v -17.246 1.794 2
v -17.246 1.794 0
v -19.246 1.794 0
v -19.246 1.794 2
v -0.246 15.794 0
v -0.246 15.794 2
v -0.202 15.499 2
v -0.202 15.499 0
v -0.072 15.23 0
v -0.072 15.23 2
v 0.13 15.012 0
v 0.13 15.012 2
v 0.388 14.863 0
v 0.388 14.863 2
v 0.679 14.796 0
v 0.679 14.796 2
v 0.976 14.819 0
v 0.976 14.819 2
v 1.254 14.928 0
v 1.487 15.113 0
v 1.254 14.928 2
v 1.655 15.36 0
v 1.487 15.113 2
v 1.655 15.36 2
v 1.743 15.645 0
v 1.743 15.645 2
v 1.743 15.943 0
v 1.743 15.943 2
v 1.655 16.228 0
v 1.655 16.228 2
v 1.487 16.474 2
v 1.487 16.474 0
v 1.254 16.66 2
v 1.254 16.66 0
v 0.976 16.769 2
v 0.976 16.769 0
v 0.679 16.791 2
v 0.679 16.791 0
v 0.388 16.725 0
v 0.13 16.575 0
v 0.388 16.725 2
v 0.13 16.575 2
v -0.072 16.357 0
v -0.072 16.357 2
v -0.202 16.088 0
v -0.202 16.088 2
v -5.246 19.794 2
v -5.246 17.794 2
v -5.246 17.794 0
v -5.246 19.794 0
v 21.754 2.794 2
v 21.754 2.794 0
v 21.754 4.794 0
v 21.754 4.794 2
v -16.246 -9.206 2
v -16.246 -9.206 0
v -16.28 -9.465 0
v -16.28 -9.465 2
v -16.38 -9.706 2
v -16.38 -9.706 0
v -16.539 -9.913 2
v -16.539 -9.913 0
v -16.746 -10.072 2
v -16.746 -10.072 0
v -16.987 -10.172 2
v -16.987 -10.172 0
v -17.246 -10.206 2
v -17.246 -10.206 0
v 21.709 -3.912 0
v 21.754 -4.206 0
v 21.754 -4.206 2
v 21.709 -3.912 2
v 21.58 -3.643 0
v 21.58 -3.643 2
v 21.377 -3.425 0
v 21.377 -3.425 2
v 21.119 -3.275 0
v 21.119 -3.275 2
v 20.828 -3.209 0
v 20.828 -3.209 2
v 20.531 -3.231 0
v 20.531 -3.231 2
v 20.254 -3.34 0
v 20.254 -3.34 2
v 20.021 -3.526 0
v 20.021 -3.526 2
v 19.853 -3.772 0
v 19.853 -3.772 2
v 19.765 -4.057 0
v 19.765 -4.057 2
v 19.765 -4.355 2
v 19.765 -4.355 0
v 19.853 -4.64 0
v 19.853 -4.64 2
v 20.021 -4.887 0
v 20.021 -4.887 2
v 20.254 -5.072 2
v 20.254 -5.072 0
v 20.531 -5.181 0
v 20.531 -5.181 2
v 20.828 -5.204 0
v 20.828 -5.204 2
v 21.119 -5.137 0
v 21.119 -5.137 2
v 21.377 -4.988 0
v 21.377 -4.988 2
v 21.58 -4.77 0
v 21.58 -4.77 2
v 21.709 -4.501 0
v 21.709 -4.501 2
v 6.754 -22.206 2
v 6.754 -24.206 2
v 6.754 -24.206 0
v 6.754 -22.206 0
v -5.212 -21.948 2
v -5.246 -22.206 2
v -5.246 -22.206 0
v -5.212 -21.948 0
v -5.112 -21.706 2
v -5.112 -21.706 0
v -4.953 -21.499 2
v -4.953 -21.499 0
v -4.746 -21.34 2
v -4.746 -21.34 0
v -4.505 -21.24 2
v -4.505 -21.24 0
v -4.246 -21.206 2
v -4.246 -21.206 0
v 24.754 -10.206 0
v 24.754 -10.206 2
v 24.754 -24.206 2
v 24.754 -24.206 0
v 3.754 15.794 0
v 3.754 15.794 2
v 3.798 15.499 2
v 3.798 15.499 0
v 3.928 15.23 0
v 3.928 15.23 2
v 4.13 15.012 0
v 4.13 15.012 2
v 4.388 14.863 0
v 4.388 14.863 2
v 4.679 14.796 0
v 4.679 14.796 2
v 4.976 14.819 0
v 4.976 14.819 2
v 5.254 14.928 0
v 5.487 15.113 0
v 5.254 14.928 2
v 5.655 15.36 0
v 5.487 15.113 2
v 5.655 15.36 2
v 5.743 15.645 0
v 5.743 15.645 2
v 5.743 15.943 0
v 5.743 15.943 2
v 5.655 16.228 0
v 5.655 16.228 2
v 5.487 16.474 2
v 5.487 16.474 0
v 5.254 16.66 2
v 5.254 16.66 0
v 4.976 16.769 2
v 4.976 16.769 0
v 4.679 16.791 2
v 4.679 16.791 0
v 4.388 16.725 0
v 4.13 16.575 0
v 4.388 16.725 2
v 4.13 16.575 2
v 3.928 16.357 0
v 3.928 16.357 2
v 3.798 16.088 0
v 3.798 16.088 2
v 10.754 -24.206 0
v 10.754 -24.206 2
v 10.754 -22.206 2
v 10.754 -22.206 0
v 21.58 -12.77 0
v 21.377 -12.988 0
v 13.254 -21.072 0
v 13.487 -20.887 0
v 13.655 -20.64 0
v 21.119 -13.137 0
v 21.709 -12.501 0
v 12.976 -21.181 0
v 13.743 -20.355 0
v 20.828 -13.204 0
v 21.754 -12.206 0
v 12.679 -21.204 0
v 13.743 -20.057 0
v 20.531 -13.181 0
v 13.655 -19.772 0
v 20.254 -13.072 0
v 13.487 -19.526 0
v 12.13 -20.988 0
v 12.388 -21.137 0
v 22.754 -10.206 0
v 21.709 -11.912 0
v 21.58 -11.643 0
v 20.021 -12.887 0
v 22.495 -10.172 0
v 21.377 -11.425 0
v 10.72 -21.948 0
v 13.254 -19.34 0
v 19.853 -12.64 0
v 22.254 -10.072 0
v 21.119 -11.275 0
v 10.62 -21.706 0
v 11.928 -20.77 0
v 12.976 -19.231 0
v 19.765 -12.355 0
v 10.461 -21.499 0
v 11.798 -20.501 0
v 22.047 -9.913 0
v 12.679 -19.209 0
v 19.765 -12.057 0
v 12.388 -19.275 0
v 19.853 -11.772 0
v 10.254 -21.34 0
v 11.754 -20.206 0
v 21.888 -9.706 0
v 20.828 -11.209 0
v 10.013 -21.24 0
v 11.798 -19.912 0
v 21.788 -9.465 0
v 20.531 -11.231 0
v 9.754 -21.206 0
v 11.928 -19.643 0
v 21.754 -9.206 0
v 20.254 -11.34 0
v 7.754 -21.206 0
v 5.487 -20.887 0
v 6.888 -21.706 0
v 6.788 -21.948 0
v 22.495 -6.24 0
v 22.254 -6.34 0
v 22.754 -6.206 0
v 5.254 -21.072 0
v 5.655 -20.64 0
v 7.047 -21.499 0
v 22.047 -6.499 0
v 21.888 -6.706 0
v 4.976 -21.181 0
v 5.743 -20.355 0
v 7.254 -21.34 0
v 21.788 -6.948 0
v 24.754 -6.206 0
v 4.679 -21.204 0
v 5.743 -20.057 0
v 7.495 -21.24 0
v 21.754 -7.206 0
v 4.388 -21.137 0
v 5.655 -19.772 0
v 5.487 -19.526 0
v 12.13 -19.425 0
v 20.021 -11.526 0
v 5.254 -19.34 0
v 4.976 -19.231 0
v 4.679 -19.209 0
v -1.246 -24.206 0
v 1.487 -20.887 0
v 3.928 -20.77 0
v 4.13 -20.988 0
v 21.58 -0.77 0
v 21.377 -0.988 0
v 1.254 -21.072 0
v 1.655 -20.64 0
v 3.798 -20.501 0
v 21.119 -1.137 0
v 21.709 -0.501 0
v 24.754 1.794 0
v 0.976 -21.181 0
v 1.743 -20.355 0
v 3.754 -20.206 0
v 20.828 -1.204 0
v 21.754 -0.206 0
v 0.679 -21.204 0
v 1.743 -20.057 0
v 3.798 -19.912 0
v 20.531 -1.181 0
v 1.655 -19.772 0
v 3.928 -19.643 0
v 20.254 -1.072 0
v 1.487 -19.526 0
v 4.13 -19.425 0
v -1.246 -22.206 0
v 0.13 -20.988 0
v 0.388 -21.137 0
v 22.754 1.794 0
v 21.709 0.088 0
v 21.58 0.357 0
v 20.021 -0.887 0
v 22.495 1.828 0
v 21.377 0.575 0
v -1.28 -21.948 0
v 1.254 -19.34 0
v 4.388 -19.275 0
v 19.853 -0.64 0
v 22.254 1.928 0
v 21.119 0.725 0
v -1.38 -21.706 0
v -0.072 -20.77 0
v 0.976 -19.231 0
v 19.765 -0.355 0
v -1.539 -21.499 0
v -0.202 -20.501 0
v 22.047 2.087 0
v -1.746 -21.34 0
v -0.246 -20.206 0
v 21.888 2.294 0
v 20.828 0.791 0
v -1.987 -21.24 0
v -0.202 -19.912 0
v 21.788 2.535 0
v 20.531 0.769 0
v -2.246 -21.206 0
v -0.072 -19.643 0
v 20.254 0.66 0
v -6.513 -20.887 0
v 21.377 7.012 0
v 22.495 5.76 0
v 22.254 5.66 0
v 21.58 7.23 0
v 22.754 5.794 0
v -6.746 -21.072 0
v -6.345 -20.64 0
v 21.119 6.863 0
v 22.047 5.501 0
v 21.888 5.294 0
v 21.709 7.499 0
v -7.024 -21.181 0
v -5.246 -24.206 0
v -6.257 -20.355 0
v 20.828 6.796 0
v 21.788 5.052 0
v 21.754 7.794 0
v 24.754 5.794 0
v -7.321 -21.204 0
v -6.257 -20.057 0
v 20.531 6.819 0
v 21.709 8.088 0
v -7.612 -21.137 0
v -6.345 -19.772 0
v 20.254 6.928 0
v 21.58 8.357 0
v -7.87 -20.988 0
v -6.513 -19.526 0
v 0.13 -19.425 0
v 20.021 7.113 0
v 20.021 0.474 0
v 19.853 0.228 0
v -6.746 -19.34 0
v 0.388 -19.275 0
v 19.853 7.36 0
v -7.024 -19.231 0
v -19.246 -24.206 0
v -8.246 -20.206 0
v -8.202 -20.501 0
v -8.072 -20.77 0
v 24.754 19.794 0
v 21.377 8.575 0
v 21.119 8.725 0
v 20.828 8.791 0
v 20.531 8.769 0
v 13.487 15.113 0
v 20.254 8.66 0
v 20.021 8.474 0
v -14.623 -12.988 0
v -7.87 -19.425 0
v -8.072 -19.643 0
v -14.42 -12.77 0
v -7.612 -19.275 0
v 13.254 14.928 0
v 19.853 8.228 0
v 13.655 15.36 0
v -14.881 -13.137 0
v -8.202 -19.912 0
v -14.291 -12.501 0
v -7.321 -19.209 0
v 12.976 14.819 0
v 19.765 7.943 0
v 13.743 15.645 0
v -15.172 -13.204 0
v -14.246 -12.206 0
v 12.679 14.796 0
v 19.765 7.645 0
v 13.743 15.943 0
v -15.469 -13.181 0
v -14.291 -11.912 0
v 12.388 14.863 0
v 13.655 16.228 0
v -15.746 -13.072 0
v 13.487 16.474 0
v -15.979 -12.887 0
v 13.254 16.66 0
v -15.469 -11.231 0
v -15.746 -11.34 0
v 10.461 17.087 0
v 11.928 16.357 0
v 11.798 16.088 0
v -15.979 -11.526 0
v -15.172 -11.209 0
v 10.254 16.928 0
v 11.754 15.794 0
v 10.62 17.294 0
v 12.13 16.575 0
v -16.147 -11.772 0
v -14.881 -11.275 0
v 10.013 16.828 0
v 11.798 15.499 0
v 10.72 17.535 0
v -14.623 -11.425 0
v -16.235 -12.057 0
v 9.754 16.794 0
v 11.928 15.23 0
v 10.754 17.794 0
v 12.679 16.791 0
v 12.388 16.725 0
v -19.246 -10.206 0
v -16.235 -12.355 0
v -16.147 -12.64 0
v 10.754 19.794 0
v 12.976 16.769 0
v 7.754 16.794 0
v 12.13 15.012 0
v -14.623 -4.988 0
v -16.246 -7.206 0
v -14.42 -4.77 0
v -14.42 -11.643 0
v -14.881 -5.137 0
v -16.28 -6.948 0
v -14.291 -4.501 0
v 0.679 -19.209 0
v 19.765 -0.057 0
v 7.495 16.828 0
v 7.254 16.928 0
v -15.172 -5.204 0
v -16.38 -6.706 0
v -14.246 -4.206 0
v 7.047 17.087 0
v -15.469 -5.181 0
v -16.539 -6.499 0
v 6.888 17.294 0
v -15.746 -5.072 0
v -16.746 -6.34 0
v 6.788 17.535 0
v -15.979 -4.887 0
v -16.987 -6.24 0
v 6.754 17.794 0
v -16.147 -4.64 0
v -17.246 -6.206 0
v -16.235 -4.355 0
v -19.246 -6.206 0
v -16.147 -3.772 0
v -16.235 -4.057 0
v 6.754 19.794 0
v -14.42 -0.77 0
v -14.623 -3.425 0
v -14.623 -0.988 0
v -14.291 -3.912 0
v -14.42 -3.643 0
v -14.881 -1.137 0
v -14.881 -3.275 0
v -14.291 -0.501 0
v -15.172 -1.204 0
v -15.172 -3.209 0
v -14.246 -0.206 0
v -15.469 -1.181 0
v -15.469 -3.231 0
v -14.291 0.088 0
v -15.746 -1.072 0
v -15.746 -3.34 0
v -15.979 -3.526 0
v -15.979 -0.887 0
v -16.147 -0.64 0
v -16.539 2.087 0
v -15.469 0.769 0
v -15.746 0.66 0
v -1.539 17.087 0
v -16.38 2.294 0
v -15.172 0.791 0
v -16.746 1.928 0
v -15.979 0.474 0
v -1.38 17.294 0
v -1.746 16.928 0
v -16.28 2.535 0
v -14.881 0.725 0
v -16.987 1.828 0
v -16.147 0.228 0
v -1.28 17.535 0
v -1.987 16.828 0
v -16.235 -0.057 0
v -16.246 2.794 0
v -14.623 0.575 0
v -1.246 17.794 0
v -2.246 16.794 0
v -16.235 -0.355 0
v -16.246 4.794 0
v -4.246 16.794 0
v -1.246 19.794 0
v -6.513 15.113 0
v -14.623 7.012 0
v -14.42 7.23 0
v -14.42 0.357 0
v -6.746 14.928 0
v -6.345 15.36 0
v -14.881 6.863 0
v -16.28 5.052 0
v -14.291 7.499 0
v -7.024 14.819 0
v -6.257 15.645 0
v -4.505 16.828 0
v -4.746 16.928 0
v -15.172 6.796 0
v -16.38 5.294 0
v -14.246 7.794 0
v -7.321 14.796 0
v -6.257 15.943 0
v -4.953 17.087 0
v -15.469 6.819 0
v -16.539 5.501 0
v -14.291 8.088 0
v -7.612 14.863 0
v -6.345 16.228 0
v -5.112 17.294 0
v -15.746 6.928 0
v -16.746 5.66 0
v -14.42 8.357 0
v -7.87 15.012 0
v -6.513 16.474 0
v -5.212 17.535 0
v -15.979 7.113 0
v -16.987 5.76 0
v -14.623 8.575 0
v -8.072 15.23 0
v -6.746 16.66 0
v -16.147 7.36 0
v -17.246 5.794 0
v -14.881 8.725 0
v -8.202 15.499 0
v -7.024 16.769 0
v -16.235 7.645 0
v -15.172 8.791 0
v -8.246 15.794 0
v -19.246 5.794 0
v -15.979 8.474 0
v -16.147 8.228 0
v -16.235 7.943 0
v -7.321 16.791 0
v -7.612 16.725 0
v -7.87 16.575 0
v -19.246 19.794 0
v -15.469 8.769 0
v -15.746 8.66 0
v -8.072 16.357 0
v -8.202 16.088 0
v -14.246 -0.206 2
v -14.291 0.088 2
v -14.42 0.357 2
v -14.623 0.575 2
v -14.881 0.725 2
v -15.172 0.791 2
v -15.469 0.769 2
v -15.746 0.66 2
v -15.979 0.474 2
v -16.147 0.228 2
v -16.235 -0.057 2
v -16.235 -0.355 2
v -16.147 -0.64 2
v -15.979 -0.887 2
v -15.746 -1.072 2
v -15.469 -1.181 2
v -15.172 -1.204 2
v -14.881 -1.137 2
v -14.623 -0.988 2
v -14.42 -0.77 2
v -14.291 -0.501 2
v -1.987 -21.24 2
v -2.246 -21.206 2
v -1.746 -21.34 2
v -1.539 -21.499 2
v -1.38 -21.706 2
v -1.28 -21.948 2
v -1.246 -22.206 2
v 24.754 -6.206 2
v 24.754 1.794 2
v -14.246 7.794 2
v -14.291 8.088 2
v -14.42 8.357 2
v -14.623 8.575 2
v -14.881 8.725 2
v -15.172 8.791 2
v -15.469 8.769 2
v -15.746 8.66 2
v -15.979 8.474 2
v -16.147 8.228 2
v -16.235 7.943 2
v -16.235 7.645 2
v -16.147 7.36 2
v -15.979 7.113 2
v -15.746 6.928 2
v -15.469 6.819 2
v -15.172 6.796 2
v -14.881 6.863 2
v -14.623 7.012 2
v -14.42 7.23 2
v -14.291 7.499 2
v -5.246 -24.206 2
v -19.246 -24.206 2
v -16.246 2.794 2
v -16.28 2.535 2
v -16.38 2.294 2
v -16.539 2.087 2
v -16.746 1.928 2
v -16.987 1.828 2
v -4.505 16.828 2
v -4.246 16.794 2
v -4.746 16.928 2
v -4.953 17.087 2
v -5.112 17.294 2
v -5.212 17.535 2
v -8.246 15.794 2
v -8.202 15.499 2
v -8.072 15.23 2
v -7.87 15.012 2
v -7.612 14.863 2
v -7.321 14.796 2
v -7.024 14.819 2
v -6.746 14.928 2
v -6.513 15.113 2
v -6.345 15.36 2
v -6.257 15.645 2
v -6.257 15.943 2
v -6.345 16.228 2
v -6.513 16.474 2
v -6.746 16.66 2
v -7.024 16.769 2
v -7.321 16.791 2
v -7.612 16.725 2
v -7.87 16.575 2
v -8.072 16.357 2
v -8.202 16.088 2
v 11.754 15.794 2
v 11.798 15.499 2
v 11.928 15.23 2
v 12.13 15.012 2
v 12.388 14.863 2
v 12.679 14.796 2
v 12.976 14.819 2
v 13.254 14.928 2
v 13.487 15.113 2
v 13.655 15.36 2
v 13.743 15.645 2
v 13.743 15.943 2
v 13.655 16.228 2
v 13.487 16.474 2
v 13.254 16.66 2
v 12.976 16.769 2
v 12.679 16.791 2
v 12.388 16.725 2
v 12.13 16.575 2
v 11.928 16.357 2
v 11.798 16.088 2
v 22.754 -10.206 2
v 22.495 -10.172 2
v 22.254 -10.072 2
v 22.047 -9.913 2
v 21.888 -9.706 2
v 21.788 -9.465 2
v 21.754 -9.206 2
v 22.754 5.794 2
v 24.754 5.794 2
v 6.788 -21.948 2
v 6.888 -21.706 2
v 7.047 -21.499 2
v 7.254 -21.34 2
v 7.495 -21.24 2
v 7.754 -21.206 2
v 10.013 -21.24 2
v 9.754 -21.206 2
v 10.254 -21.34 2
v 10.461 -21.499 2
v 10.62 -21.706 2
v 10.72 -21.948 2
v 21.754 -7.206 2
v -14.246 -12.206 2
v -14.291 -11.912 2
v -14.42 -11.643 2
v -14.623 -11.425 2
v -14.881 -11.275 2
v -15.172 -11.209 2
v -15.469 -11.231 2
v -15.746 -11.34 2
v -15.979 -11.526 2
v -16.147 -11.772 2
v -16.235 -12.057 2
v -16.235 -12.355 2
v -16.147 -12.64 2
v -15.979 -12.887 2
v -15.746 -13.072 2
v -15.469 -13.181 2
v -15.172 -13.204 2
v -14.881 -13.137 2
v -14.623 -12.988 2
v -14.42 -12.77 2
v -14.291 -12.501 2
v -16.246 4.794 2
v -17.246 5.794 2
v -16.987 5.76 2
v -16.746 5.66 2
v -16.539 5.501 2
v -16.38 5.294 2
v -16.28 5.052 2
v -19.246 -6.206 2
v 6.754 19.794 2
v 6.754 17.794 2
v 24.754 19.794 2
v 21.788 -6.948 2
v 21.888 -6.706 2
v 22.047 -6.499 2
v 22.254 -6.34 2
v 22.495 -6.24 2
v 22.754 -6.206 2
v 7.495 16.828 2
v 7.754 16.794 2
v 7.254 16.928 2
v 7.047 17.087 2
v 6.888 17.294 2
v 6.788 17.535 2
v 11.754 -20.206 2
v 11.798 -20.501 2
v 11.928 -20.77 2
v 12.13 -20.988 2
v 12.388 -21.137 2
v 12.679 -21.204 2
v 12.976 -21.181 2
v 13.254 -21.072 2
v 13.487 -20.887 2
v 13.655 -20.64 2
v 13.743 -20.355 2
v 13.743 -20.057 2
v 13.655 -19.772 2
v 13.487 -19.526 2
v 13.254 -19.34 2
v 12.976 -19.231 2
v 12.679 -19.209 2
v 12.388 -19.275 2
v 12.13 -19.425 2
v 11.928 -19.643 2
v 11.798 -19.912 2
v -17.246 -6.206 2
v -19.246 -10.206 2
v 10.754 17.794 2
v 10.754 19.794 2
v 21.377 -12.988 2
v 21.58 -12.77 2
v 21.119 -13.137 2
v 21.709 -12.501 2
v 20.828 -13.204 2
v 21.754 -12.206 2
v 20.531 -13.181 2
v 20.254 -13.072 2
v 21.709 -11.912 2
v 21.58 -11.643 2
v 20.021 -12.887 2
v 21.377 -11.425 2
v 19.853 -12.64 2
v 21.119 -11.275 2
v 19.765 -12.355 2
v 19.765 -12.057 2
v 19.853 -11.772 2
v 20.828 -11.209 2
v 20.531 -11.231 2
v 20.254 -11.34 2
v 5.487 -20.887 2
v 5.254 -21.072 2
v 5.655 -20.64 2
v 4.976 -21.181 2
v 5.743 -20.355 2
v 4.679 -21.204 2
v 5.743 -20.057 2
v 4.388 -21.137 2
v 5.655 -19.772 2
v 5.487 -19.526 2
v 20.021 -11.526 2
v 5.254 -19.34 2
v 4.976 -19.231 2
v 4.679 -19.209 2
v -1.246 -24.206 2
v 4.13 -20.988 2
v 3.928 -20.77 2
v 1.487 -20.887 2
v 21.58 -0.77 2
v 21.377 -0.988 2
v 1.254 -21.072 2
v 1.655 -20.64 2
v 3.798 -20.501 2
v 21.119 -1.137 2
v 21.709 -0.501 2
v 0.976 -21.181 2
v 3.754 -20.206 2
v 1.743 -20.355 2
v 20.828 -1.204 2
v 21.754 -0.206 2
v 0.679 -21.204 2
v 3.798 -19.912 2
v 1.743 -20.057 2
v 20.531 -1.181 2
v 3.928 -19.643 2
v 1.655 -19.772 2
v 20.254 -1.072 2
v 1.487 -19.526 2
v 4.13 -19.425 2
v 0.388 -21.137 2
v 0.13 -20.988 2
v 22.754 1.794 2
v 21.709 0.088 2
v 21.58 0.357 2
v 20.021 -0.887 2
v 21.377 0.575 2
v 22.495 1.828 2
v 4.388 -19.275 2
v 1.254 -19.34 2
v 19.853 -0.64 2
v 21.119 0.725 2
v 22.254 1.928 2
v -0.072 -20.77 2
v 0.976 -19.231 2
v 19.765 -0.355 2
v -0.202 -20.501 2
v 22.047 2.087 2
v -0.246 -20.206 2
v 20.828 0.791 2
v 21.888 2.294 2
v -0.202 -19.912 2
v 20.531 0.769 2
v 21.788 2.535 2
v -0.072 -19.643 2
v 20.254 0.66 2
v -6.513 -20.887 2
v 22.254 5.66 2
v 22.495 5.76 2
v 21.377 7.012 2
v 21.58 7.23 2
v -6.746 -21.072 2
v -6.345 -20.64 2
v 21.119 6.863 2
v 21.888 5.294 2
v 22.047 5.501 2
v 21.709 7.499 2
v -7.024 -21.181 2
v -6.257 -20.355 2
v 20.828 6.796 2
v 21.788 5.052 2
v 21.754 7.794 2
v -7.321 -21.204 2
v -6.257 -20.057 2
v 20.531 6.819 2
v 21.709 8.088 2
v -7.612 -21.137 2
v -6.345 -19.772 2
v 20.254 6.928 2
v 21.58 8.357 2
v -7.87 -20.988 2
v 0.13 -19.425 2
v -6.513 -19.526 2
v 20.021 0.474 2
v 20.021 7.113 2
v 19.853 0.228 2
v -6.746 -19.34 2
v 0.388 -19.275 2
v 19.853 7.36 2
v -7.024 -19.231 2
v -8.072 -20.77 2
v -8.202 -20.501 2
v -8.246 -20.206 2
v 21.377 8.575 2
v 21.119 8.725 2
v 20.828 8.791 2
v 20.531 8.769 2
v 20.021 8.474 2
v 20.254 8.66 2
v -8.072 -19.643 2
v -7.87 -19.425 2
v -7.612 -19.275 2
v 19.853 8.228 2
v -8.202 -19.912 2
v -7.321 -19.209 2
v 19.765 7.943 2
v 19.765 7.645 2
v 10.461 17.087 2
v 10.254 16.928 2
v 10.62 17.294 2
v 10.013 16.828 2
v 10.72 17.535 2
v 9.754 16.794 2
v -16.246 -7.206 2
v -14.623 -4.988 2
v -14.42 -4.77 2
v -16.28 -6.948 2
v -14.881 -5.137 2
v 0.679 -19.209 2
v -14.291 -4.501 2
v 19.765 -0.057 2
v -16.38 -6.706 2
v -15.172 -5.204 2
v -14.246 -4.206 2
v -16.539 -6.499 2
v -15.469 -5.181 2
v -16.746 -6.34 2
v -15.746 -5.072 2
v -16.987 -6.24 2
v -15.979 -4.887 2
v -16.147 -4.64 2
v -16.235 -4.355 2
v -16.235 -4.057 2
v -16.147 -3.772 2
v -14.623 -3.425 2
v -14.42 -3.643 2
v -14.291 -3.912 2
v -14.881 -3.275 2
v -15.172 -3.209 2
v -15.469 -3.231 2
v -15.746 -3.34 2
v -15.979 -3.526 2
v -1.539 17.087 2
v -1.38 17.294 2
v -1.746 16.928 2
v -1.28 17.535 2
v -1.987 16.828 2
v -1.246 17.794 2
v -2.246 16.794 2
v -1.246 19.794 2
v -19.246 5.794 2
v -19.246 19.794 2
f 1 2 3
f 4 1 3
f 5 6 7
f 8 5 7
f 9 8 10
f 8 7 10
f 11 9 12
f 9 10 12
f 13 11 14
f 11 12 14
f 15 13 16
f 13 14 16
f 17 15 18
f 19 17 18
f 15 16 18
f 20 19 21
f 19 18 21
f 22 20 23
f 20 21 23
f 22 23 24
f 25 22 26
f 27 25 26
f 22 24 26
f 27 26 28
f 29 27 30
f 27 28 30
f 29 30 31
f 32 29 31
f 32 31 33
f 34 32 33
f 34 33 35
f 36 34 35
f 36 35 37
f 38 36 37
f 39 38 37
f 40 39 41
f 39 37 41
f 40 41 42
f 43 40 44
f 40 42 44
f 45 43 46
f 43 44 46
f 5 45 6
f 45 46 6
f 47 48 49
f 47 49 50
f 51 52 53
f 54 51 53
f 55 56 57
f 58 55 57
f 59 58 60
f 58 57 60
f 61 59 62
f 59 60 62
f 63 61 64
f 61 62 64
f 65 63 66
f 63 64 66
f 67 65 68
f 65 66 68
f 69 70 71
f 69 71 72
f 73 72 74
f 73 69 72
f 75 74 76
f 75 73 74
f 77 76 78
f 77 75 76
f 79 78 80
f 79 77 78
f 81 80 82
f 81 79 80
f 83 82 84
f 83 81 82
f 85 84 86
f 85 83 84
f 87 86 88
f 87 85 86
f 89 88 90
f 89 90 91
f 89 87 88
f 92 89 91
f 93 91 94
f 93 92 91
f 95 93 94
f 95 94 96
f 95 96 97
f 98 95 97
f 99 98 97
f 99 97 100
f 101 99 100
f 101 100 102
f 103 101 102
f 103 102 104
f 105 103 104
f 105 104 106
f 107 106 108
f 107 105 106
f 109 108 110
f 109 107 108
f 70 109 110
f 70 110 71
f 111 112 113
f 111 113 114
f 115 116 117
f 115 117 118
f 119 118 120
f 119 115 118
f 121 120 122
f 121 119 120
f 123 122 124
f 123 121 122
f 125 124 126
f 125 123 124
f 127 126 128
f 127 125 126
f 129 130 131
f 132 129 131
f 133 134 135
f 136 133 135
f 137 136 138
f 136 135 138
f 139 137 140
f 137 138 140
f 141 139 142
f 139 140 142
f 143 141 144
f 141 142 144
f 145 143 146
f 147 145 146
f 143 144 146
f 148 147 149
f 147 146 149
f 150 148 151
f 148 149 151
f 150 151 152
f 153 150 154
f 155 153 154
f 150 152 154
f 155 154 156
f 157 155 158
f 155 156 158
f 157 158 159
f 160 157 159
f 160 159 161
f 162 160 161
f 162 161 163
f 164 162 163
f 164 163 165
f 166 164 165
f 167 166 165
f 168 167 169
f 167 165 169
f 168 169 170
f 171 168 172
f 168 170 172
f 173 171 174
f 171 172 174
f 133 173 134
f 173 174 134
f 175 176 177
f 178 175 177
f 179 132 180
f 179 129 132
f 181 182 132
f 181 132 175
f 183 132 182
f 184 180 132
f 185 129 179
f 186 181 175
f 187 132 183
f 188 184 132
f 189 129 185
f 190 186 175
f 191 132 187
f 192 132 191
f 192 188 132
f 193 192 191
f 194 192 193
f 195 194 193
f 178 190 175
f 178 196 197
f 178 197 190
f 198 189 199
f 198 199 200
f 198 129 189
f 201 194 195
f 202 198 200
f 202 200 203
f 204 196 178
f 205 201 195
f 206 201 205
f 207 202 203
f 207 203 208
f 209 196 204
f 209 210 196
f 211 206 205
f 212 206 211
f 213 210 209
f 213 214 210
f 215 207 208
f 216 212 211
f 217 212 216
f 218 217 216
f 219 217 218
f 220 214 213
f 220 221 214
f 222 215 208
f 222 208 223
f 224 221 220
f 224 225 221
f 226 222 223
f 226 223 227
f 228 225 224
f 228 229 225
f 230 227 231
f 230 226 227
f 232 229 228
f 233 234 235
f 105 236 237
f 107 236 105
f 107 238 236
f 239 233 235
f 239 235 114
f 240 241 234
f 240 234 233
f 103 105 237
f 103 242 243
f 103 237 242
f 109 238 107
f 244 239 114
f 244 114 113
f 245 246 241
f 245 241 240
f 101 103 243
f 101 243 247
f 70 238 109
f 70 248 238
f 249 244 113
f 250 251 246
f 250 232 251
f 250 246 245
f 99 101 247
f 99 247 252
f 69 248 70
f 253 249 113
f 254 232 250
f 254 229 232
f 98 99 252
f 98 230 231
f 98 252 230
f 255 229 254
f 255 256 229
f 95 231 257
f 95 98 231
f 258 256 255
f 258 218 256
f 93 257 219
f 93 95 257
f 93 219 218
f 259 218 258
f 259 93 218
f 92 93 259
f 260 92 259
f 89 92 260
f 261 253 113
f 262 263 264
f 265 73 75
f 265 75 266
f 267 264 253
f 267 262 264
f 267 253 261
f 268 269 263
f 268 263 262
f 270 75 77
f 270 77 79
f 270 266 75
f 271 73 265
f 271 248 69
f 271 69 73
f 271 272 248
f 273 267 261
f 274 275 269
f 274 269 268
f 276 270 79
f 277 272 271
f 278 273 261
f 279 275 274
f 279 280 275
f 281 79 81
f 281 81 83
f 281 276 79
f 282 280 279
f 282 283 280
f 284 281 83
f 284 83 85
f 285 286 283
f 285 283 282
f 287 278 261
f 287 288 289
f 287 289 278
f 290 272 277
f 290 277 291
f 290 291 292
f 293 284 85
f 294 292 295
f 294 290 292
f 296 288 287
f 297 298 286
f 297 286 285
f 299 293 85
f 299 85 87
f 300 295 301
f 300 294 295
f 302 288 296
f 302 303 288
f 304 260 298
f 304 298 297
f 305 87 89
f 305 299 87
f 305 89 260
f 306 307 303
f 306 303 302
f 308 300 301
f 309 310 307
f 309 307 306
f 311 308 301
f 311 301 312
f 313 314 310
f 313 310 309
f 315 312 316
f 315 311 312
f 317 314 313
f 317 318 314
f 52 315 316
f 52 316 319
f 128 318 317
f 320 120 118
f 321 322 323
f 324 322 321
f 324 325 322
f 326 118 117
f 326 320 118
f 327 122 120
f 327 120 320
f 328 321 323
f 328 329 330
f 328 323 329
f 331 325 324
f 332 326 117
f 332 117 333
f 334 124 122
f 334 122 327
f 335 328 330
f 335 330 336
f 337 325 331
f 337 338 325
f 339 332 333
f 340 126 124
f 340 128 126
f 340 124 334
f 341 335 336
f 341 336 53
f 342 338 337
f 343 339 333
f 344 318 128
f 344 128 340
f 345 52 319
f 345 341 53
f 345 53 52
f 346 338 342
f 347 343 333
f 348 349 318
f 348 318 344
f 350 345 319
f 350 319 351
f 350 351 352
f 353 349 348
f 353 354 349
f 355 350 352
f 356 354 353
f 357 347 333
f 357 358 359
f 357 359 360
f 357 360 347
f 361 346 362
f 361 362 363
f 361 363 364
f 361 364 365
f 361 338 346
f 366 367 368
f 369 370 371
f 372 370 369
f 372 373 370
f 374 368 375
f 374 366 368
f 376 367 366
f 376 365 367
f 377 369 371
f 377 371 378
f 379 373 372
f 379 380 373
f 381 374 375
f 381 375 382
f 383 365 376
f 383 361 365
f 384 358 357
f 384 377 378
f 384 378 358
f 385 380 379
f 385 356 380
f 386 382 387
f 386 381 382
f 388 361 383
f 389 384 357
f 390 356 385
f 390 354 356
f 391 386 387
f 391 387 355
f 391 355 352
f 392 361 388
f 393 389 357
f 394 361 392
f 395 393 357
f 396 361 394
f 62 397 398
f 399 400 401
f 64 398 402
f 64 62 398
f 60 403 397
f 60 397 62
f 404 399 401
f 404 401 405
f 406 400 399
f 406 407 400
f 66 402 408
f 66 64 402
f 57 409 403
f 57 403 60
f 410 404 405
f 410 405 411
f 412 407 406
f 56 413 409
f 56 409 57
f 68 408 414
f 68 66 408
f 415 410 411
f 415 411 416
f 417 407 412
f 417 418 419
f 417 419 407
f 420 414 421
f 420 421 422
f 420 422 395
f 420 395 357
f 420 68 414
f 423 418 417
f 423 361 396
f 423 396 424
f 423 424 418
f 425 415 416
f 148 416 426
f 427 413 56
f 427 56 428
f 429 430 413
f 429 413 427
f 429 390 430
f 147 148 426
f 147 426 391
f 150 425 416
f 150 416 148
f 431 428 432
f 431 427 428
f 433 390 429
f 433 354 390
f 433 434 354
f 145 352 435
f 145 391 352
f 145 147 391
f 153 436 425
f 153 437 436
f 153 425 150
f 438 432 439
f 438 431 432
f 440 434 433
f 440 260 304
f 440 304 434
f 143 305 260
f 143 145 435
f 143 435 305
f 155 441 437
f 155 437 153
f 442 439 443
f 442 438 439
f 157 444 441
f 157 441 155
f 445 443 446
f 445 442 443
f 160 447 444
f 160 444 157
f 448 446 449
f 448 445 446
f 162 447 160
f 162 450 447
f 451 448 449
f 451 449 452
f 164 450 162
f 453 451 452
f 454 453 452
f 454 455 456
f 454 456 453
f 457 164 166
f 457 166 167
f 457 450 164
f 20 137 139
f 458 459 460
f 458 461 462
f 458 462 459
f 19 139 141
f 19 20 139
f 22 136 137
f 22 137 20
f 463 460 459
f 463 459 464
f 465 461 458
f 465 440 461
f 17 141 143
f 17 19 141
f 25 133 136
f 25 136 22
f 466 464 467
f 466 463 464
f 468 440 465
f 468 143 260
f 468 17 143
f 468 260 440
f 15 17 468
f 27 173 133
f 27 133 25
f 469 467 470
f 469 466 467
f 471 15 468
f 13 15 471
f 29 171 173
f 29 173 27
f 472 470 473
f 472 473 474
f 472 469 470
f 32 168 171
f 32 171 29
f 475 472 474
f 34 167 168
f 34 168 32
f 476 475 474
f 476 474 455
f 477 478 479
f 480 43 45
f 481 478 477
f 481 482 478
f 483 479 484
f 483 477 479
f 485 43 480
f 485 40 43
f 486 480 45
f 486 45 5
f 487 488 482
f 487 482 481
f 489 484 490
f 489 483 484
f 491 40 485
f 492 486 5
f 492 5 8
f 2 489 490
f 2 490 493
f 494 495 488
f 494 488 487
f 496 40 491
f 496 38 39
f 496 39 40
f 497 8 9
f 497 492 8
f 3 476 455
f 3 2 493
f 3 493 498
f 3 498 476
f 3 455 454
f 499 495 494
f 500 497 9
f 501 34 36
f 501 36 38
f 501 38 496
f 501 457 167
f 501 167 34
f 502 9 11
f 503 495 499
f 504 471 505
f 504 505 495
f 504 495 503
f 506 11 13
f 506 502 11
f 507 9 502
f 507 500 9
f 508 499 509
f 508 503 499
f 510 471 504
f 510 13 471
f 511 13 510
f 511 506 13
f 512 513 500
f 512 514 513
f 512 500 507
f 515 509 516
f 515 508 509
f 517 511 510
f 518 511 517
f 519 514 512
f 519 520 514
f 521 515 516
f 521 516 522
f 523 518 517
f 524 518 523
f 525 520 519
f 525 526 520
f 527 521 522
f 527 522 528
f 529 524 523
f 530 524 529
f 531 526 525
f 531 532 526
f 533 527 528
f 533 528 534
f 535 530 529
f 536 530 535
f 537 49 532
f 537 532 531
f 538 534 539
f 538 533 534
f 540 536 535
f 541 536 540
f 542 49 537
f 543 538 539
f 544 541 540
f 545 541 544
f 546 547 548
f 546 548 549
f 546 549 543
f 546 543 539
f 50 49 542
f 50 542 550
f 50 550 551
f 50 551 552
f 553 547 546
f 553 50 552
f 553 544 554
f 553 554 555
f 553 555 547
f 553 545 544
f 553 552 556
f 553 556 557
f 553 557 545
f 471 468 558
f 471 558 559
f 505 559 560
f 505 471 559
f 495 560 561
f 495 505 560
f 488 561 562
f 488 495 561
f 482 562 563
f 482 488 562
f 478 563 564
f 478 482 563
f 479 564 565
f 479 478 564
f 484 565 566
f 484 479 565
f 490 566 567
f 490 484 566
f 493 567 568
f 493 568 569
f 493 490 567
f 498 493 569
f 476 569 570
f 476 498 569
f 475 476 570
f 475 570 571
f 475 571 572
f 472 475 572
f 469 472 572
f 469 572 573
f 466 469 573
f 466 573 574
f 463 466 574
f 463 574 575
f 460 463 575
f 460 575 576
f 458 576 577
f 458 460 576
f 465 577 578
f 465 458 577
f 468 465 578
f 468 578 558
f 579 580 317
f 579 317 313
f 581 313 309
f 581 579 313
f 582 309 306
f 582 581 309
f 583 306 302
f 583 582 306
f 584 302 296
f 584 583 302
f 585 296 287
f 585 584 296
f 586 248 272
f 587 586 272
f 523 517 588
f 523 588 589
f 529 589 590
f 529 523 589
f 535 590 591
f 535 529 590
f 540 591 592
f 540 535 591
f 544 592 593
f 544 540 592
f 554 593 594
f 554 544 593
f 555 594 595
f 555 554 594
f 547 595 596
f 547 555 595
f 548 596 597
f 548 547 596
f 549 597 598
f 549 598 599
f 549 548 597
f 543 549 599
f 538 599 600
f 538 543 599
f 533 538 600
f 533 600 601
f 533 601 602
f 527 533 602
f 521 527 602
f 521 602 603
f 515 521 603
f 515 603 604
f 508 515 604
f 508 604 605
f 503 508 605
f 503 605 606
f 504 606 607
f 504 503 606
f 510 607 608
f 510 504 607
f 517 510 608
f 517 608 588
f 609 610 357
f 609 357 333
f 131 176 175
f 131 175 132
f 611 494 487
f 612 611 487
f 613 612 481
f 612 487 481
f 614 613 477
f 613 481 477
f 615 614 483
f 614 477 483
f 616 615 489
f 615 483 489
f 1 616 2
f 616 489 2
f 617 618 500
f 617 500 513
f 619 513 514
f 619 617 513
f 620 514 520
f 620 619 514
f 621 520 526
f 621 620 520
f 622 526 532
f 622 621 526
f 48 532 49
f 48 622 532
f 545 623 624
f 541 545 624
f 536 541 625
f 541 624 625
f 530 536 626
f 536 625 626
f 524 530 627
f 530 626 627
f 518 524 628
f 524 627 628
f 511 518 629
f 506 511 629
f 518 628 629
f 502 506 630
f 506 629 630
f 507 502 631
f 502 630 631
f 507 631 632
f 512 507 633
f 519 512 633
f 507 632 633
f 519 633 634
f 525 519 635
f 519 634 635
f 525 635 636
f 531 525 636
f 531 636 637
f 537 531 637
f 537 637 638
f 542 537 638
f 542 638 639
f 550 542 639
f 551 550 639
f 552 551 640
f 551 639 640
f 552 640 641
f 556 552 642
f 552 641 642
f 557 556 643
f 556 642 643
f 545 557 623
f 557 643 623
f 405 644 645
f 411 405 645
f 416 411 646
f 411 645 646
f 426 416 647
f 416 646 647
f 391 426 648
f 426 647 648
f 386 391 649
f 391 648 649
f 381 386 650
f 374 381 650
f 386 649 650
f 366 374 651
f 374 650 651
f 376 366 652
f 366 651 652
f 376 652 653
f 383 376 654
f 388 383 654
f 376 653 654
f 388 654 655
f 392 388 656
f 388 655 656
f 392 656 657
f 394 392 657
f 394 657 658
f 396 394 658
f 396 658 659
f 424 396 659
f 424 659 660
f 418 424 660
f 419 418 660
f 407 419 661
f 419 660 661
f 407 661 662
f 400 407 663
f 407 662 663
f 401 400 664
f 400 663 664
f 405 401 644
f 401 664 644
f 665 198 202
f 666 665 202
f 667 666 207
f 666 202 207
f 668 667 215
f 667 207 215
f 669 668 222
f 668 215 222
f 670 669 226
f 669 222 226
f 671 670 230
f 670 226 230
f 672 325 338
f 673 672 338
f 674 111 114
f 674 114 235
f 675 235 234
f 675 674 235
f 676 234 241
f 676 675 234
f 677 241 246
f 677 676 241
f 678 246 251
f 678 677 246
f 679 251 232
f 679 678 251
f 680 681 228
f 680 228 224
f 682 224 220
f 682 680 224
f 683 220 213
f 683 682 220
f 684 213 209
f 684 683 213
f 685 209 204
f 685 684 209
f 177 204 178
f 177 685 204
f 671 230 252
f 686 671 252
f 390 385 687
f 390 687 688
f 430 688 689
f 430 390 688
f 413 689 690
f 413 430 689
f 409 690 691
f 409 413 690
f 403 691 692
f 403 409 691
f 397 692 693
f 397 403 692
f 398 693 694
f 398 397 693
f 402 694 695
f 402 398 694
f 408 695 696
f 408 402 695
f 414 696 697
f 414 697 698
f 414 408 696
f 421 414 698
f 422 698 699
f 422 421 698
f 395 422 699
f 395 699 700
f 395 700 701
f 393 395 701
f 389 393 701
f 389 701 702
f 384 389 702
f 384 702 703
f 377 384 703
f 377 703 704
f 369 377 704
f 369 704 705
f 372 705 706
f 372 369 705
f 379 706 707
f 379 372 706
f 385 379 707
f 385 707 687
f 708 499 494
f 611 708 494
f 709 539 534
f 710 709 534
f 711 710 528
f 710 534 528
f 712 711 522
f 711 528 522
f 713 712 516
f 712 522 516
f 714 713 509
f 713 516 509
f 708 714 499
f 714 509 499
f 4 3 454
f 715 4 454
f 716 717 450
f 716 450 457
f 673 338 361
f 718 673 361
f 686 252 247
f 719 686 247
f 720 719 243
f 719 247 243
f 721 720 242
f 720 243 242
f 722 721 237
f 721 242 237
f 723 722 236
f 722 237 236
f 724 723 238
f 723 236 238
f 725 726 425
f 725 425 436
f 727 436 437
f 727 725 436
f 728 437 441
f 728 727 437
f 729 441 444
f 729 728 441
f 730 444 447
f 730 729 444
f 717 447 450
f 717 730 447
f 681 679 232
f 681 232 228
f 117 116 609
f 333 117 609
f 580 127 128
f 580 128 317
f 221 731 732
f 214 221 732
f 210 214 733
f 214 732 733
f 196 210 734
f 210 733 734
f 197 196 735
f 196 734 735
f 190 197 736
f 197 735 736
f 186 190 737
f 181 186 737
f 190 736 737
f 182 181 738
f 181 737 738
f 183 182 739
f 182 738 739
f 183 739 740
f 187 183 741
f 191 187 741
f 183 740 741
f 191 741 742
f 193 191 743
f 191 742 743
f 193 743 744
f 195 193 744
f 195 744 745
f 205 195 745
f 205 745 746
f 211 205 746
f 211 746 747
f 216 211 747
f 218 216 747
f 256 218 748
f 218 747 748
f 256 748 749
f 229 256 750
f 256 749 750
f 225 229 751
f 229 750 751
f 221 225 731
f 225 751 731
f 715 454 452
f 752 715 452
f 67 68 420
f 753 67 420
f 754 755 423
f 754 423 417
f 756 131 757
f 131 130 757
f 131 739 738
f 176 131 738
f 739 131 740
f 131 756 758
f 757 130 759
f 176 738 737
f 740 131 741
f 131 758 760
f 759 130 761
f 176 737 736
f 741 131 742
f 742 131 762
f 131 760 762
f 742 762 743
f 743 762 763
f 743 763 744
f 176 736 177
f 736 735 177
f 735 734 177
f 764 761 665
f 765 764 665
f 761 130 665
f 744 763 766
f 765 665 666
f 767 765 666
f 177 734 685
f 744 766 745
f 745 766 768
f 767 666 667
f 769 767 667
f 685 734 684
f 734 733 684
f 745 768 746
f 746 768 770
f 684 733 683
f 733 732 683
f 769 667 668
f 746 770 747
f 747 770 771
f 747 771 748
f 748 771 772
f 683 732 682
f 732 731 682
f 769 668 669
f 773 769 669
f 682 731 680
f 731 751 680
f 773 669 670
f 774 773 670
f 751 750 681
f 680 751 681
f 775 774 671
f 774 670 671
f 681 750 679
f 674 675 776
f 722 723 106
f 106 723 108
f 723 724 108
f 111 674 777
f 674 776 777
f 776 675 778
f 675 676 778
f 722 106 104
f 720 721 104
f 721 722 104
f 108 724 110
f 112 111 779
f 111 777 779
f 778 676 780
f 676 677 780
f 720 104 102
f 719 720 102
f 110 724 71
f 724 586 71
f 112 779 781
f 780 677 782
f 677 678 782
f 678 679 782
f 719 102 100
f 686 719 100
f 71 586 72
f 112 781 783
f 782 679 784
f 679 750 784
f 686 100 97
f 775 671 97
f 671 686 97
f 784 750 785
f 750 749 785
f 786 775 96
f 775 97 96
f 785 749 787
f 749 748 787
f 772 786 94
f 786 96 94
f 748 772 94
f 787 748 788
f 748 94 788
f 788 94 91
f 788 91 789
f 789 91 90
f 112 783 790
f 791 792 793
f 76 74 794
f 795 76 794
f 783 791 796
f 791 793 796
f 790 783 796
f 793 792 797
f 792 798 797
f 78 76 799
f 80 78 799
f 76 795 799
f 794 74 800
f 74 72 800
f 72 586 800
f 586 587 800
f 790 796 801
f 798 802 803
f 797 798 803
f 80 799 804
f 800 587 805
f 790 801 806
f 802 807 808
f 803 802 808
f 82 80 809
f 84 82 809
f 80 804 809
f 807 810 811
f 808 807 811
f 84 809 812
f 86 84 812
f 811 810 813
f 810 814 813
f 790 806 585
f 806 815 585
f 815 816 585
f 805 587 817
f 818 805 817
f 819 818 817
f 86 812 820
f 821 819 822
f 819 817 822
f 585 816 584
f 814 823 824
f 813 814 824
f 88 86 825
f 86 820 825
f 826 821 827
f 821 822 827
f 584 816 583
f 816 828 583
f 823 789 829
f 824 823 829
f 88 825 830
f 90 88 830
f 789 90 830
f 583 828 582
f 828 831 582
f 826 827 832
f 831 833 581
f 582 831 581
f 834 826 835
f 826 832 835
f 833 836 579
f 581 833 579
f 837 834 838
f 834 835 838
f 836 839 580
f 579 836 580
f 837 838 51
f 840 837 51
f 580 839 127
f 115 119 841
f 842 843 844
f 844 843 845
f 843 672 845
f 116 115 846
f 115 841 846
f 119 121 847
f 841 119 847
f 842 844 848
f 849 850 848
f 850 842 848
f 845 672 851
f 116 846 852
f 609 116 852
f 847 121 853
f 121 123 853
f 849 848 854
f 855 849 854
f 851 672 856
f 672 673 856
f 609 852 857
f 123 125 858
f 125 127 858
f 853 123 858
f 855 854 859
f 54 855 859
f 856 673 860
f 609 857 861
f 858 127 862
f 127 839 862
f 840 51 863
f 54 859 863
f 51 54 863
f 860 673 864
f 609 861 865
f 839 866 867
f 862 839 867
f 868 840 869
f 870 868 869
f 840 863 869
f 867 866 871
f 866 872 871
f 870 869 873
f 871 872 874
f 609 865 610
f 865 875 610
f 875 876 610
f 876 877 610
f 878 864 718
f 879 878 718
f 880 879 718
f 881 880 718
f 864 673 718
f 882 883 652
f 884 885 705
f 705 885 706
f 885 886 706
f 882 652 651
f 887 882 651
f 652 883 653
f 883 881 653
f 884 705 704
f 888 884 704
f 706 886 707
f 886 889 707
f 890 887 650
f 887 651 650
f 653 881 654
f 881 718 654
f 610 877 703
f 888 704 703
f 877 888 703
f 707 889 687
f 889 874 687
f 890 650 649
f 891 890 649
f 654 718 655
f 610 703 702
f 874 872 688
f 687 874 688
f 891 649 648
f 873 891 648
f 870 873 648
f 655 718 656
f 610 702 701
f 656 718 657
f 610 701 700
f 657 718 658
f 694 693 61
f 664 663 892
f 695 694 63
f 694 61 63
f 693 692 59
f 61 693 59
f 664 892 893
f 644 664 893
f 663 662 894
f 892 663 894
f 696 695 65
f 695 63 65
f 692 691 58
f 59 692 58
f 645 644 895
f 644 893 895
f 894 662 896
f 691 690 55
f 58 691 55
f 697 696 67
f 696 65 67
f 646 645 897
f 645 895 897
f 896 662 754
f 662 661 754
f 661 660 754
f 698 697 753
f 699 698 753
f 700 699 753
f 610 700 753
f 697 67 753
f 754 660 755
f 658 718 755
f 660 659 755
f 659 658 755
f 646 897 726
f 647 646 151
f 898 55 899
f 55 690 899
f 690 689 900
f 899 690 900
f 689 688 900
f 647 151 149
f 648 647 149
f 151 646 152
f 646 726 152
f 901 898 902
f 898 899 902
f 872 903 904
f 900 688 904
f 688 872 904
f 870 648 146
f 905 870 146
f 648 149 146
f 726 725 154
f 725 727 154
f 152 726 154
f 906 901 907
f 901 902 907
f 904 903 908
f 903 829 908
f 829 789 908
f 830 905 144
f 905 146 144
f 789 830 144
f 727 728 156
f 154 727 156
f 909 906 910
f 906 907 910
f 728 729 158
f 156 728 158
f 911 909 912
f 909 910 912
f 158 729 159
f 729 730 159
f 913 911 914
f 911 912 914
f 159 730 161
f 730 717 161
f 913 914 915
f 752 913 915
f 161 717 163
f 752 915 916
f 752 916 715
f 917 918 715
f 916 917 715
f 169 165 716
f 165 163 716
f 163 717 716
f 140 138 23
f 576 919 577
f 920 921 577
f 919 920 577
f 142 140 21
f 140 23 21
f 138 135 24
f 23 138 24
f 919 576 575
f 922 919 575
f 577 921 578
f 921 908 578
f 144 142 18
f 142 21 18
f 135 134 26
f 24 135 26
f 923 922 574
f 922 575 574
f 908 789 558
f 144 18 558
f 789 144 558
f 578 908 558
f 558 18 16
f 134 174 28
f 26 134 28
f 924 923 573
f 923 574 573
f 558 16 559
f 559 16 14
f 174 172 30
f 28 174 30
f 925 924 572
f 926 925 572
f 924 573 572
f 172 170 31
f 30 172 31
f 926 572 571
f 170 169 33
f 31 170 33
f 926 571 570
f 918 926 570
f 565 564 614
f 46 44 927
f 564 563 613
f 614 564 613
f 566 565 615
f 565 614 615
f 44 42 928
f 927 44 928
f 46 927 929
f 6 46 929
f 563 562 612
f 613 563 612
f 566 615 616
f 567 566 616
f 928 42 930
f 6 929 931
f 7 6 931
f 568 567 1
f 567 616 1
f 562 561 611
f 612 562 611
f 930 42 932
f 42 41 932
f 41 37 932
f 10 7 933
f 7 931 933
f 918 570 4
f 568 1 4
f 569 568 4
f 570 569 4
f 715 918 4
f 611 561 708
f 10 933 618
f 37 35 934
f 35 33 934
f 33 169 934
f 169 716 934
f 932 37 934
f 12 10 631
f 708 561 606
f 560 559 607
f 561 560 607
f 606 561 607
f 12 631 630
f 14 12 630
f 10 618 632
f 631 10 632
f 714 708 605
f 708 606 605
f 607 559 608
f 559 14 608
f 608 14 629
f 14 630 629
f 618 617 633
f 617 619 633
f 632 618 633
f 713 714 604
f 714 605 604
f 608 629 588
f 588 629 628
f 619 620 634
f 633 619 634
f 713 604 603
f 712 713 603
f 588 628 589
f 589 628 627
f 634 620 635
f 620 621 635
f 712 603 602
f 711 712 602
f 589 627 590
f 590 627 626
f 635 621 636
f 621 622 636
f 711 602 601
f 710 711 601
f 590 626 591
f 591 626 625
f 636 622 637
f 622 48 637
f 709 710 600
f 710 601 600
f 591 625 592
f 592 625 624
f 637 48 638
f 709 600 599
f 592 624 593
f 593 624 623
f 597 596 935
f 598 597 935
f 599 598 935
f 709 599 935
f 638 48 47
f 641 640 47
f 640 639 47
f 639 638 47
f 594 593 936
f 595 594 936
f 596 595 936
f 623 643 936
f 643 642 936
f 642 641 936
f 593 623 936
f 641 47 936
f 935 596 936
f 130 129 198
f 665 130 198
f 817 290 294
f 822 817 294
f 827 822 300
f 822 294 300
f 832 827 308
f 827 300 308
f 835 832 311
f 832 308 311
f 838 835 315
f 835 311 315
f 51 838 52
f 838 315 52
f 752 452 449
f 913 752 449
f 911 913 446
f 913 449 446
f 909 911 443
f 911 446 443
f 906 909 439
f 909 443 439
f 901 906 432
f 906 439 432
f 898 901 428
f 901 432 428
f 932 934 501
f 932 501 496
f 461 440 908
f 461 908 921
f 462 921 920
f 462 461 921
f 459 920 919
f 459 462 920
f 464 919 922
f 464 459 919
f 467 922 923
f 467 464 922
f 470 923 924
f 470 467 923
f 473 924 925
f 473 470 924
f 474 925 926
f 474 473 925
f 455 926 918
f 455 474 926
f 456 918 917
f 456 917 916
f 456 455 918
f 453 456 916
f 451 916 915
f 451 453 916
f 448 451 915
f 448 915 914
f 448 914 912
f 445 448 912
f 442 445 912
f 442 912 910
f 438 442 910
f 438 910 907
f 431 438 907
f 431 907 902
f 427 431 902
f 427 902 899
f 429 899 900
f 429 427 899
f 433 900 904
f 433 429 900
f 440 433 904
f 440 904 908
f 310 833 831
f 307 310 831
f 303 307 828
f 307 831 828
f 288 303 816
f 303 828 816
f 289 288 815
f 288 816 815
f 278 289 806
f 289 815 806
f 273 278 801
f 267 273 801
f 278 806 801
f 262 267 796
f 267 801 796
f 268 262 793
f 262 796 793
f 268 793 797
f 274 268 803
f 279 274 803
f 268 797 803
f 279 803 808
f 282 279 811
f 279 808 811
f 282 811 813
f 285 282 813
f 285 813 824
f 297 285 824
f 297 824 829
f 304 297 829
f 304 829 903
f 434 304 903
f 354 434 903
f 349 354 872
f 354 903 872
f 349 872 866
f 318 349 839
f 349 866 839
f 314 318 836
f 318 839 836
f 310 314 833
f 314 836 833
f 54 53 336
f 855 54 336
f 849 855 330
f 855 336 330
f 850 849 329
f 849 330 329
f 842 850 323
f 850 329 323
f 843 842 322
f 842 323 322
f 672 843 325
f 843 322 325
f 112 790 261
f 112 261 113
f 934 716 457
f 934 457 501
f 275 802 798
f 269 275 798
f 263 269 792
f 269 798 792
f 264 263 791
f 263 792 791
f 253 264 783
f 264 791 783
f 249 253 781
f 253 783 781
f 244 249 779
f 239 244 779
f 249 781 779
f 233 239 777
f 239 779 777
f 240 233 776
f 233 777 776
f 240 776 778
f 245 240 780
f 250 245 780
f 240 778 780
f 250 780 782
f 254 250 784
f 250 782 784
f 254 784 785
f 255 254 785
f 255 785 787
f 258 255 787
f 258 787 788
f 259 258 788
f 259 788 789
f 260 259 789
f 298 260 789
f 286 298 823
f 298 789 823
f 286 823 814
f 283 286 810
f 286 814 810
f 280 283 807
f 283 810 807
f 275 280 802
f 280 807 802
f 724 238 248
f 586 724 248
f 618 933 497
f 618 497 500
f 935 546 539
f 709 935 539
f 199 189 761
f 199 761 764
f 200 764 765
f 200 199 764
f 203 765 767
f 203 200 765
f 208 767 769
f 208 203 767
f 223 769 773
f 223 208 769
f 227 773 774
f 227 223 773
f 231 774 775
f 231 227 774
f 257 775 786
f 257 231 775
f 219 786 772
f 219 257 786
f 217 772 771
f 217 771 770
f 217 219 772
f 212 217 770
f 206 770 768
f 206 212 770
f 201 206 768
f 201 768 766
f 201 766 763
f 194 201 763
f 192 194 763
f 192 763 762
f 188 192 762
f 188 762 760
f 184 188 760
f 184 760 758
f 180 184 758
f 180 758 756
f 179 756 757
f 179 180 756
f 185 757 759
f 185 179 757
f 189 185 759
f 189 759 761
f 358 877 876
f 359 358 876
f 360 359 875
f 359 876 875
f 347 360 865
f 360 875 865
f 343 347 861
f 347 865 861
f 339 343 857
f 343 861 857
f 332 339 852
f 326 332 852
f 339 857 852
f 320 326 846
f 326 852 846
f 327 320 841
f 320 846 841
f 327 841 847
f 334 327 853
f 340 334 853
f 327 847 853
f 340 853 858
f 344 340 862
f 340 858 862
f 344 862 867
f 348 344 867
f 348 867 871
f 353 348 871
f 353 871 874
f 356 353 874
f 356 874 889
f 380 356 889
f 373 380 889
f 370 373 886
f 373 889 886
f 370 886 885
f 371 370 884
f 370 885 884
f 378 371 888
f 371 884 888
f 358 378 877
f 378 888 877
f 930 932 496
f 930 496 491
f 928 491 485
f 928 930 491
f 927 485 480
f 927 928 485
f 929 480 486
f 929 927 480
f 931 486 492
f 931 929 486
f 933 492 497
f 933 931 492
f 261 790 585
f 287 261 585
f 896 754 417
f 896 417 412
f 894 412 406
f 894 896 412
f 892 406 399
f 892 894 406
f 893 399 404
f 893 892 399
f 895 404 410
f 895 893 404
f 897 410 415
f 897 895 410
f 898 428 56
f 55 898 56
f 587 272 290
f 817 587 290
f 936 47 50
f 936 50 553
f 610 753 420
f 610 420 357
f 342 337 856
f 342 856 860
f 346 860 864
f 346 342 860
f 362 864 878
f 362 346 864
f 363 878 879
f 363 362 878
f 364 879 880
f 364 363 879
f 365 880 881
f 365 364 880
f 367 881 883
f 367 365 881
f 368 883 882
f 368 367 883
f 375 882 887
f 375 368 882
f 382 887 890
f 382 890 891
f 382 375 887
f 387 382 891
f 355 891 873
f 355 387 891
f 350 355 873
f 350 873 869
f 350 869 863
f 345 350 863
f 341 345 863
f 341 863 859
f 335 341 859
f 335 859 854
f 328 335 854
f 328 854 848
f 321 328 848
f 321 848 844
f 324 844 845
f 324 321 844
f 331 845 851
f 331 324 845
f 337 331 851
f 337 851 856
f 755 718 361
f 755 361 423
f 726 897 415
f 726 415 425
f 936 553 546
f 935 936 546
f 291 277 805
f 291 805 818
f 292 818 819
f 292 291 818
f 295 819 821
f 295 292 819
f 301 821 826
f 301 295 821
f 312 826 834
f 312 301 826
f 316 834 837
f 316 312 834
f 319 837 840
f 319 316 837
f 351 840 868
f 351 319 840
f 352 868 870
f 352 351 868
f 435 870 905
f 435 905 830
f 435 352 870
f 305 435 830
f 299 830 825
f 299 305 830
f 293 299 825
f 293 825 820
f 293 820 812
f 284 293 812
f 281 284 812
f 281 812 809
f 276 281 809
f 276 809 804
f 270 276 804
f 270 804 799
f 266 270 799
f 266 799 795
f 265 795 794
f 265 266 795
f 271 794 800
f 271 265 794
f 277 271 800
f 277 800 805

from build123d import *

# Parameters (mm, degrees)
SKETCH_1_R          = 1
EXTRUDE_4_DEPTH     = 2
FILLET_1_R          = 1
EXTRUDE_5_DEPTH     = 2
SKETCH_5_R          = 1
CUT_EXTRUDE_3_DEPTH = 2
SKETCH_6_W          = 8
SKETCH_6_H          = 3
EXTRUDE_6_DEPTH     = 2


with BuildPart() as part:
    # 草圖1 → 填料-伸長4 (new body)
    with BuildSketch(Plane.XY):
        with BuildLine():
            Line((-19.246232324, 5.793640832), (-17.246232324, 5.793640832))
            ThreePointArc((-17.246232324, 5.793640832), (-16.539125543, 5.500747613), (-16.246232324, 4.793640832))
            Line((-16.246232324, 4.793640832), (-16.246232324, 2.793640832))
            ThreePointArc((-16.246232324, 2.793640832), (-16.539125543, 2.086534051), (-17.246232324, 1.793640832))
            Line((-17.246232324, 1.793640832), (-19.246232324, 1.793640832))
            Line((-19.246232324, 1.793640832), (-19.246232324, -6.206359168))
            Line((-19.246232324, -6.206359168), (-17.246232324, -6.206359168))
            ThreePointArc((-17.246232324, -6.206359168), (-16.539125543, -6.499252387), (-16.246232324, -7.206359168))
            Line((-16.246232324, -7.206359168), (-16.246232324, -9.206359168))
            ThreePointArc((-16.246232324, -9.206359168), (-16.539125543, -9.913465949), (-17.246232324, -10.206359168))
            Line((-17.246232324, -10.206359168), (-19.246232324, -10.206359168))
            Line((-19.246232324, -10.206359168), (-19.246232324, -18.206359168))
            Line((-19.246232324, -18.206359168), (24.753767676, -18.206359168))
            Line((24.753767676, -18.206359168), (24.753767676, -10.206359168))
            Line((24.753767676, -10.206359168), (22.753767676, -10.206359168))
            ThreePointArc((22.753767676, -10.206359168), (22.046660894, -9.913465949), (21.753767676, -9.206359168))
            Line((21.753767676, -9.206359168), (21.753767676, -7.206359168))
            ThreePointArc((21.753767676, -7.206359168), (22.046660894, -6.499252387), (22.753767676, -6.206359168))
            Line((22.753767676, -6.206359168), (24.753767676, -6.206359168))
            Line((24.753767676, -6.206359168), (24.753767676, 1.793640832))
            Line((24.753767676, 1.793640832), (22.753767676, 1.793640832))
            ThreePointArc((22.753767676, 1.793640832), (22.046660894, 2.086534051), (21.753767676, 2.793640832))
            Line((21.753767676, 2.793640832), (21.753767676, 4.793640832))
            ThreePointArc((21.753767676, 4.793640832), (22.046660894, 5.500747613), (22.753767676, 5.793640832))
            Line((22.753767676, 5.793640832), (24.753767676, 5.793640832))
            Line((24.753767676, 5.793640832), (24.753767676, 13.793640832))
            Line((24.753767676, 13.793640832), (-19.246232324, 13.793640832))
            Line((-19.246232324, 13.793640832), (-19.246232324, 5.793640832))
        make_face()
        with Locations((-15.246232324, 7.793640832)):
            Circle(SKETCH_1_R, mode=Mode.SUBTRACT)
        with Locations((-15.246232324, -0.206359168)):
            Circle(SKETCH_1_R, mode=Mode.SUBTRACT)
        with Locations((20.753767676, -12.206359168)):
            Circle(SKETCH_1_R, mode=Mode.SUBTRACT)
        with Locations((20.753767676, 7.793640832)):
            Circle(SKETCH_1_R, mode=Mode.SUBTRACT)
        with Locations((-15.246232324, -4.206359168)):
            Circle(SKETCH_1_R, mode=Mode.SUBTRACT)
        with Locations((-15.246232324, -12.206359168)):
            Circle(SKETCH_1_R, mode=Mode.SUBTRACT)
        with Locations((20.753767676, -0.206359168)):
            Circle(SKETCH_1_R, mode=Mode.SUBTRACT)
        with Locations((20.753767676, -4.206359168)):
            Circle(SKETCH_1_R, mode=Mode.SUBTRACT)
    extrude(amount=EXTRUDE_4_DEPTH)

    # 圓角1
    fillet_1_edges = [part.edges().sort_by_distance(p)[0] for p in [
        (-19.246232324, 13.793640832, 1),
        (24.753767676, 13.793640832, 1),
        (24.753767676, -18.206359168, 1),
        (-19.246232324, -18.206359168, 1),
    ]]
    fillet(fillet_1_edges, radius=FILLET_1_R)

    # 草圖4 → 填料-伸長5 (add)
    with BuildSketch(Plane.XY.offset(2)):
        with BuildLine():
            Line((-19.246232324, -21.206359168), (-19.246232324, -17.206359168))
            Line((-19.246232324, -17.206359168), (24.753767676, -17.206359168))
            Line((24.753767676, -17.206359168), (24.753767676, -21.206359168))
            ThreePointArc((24.753767676, -21.206359168), (24.460874457, -21.913465949), (23.753767676, -22.206359168))
            Line((23.753767676, -22.206359168), (-18.246232324, -22.206359168))
            ThreePointArc((-18.246232324, -22.206359168), (-18.953339106, -21.913465949), (-19.246232324, -21.206359168))
        make_face()
        with BuildLine():
            Line((-19.246232324, 12.793640832), (24.753767676, 12.793640832))
            Line((24.753767676, 12.793640832), (24.753767676, 16.793640832))
            ThreePointArc((24.753767676, 16.793640832), (24.460874457, 17.500747613), (23.753767676, 17.793640832))
            Line((23.753767676, 17.793640832), (-18.246232324, 17.793640832))
            ThreePointArc((-18.246232324, 17.793640832), (-18.953339106, 17.500747613), (-19.246232324, 16.793640832))
            Line((-19.246232324, 16.793640832), (-19.246232324, 12.793640832))
        make_face()
    extrude(amount=-EXTRUDE_5_DEPTH)

    # 草圖5 → 除料-伸長3 (cut)
    with BuildSketch(Plane.XY.offset(2)):
        with Locations(Location((12.753767676, 15.793640832, 0), (0, 0, 180))):
            Circle(SKETCH_5_R)
        with Locations(Location((0.753767676, 15.793640832, 0), (0, 0, 180))):
            Circle(SKETCH_5_R)
        with Locations(Location((0.753767676, -20.206359168, 0), (0, 0, 180))):
            Circle(SKETCH_5_R)
        with Locations(Location((-7.246232324, -20.206359168, 0), (0, 0, 180))):
            Circle(SKETCH_5_R)
        with Locations(Location((4.753767676, -20.206359168, 0), (0, 0, 180))):
            Circle(SKETCH_5_R)
        with Locations(Location((12.753767676, -20.206359168, 0), (0, 0, 180))):
            Circle(SKETCH_5_R)
        with Locations(Location((-7.246232324, 15.793640832, 0), (0, 0, 180))):
            Circle(SKETCH_5_R)
        with Locations(Location((4.753767676, 15.793640832, 0), (0, 0, 180))):
            Circle(SKETCH_5_R)
        with BuildLine():
            Line((-5.246232324, 19.793640832), (-1.246232324, 19.793640832))
            Line((-1.246232324, 19.793640832), (-1.246232324, 17.793640832))
            ThreePointArc((-1.246232324, 17.793640832), (-1.539125543, 17.086534051), (-2.246232324, 16.793640832))
            Line((-2.246232324, 16.793640832), (-4.246232324, 16.793640832))
            ThreePointArc((-4.246232324, 16.793640832), (-4.953339106, 17.086534051), (-5.246232324, 17.793640832))
            Line((-5.246232324, 17.793640832), (-5.246232324, 19.793640832))
        make_face()
        with BuildLine():
            Line((9.753767676, 16.793640832), (7.753767676, 16.793640832))
            ThreePointArc((7.753767676, 16.793640832), (7.046660894, 17.086534051), (6.753767676, 17.793640832))
            Line((6.753767676, 17.793640832), (6.753767676, 19.793640832))
            Line((6.753767676, 19.793640832), (10.753767676, 19.793640832))
            Line((10.753767676, 19.793640832), (10.753767676, 17.793640832))
            ThreePointArc((10.753767676, 17.793640832), (10.460874457, 17.086534051), (9.753767676, 16.793640832))
        make_face()
        with BuildLine():
            Line((10.753767676, -24.206359168), (6.753767676, -24.206359168))
            Line((6.753767676, -24.206359168), (6.753767676, -22.206359168))
            ThreePointArc((6.753767676, -22.206359168), (7.046660894, -21.499252387), (7.753767676, -21.206359168))
            Line((7.753767676, -21.206359168), (9.753767676, -21.206359168))
            ThreePointArc((9.753767676, -21.206359168), (10.460874457, -21.499252387), (10.753767676, -22.206359168))
            Line((10.753767676, -22.206359168), (10.753767676, -24.206359168))
        make_face()
        with BuildLine():
            Line((-4.246232324, -21.206359168), (-2.246232324, -21.206359168))
            ThreePointArc((-2.246232324, -21.206359168), (-1.539125543, -21.499252387), (-1.246232324, -22.206359168))
            Line((-1.246232324, -22.206359168), (-1.246232324, -24.206359168))
            Line((-1.246232324, -24.206359168), (-5.246232324, -24.206359168))
            Line((-5.246232324, -24.206359168), (-5.246232324, -22.206359168))
            ThreePointArc((-5.246232324, -22.206359168), (-4.953339106, -21.499252387), (-4.246232324, -21.206359168))
        make_face()
    extrude(amount=-CUT_EXTRUDE_3_DEPTH, mode=Mode.SUBTRACT)

    # 草圖6 → 填料-伸長6 (add)
    with BuildSketch(Plane.XY.offset(2)):
        Polygon((-19.246232324, -23.206359168), (-19.246232324, -21.206359168), (-5.246232324, -21.206359168), (-5.246232324, -24.206359168), (-18.246232324, -24.206359168), (-19.246232324, -24.206359168), align=None)
        Polygon((-19.246232324, 16.793640832), (-5.246232324, 16.793640832), (-5.246232324, 17.793640832), (-5.246232324, 19.793640832), (-18.246232324, 19.793640832), (-19.246232324, 19.793640832), (-19.246232324, 18.793640832), align=None)
        Polygon((24.753767676, 16.793640832), (24.753767676, 18.793640832), (24.753767676, 19.793640832), (23.753767676, 19.793640832), (10.753767676, 19.793640832), (10.753767676, 16.793640832), align=None)
        Polygon((24.753767676, -21.206359168), (24.753767676, -23.206359168), (24.753767676, -24.206359168), (23.753767676, -24.206359168), (10.753767676, -24.206359168), (10.753767676, -21.206359168), align=None)
        Polygon((-1.246232324, 17.793640832), (-1.246232324, 16.793640832), (6.753767676, 16.793640832), (6.753767676, 19.793640832), (-1.246232324, 19.793640832), align=None)
        with Locations((2.753767676, -22.706359168)):
            Rectangle(SKETCH_6_W, SKETCH_6_H)
    extrude(amount=-EXTRUDE_6_DEPTH)


solid = part.part
